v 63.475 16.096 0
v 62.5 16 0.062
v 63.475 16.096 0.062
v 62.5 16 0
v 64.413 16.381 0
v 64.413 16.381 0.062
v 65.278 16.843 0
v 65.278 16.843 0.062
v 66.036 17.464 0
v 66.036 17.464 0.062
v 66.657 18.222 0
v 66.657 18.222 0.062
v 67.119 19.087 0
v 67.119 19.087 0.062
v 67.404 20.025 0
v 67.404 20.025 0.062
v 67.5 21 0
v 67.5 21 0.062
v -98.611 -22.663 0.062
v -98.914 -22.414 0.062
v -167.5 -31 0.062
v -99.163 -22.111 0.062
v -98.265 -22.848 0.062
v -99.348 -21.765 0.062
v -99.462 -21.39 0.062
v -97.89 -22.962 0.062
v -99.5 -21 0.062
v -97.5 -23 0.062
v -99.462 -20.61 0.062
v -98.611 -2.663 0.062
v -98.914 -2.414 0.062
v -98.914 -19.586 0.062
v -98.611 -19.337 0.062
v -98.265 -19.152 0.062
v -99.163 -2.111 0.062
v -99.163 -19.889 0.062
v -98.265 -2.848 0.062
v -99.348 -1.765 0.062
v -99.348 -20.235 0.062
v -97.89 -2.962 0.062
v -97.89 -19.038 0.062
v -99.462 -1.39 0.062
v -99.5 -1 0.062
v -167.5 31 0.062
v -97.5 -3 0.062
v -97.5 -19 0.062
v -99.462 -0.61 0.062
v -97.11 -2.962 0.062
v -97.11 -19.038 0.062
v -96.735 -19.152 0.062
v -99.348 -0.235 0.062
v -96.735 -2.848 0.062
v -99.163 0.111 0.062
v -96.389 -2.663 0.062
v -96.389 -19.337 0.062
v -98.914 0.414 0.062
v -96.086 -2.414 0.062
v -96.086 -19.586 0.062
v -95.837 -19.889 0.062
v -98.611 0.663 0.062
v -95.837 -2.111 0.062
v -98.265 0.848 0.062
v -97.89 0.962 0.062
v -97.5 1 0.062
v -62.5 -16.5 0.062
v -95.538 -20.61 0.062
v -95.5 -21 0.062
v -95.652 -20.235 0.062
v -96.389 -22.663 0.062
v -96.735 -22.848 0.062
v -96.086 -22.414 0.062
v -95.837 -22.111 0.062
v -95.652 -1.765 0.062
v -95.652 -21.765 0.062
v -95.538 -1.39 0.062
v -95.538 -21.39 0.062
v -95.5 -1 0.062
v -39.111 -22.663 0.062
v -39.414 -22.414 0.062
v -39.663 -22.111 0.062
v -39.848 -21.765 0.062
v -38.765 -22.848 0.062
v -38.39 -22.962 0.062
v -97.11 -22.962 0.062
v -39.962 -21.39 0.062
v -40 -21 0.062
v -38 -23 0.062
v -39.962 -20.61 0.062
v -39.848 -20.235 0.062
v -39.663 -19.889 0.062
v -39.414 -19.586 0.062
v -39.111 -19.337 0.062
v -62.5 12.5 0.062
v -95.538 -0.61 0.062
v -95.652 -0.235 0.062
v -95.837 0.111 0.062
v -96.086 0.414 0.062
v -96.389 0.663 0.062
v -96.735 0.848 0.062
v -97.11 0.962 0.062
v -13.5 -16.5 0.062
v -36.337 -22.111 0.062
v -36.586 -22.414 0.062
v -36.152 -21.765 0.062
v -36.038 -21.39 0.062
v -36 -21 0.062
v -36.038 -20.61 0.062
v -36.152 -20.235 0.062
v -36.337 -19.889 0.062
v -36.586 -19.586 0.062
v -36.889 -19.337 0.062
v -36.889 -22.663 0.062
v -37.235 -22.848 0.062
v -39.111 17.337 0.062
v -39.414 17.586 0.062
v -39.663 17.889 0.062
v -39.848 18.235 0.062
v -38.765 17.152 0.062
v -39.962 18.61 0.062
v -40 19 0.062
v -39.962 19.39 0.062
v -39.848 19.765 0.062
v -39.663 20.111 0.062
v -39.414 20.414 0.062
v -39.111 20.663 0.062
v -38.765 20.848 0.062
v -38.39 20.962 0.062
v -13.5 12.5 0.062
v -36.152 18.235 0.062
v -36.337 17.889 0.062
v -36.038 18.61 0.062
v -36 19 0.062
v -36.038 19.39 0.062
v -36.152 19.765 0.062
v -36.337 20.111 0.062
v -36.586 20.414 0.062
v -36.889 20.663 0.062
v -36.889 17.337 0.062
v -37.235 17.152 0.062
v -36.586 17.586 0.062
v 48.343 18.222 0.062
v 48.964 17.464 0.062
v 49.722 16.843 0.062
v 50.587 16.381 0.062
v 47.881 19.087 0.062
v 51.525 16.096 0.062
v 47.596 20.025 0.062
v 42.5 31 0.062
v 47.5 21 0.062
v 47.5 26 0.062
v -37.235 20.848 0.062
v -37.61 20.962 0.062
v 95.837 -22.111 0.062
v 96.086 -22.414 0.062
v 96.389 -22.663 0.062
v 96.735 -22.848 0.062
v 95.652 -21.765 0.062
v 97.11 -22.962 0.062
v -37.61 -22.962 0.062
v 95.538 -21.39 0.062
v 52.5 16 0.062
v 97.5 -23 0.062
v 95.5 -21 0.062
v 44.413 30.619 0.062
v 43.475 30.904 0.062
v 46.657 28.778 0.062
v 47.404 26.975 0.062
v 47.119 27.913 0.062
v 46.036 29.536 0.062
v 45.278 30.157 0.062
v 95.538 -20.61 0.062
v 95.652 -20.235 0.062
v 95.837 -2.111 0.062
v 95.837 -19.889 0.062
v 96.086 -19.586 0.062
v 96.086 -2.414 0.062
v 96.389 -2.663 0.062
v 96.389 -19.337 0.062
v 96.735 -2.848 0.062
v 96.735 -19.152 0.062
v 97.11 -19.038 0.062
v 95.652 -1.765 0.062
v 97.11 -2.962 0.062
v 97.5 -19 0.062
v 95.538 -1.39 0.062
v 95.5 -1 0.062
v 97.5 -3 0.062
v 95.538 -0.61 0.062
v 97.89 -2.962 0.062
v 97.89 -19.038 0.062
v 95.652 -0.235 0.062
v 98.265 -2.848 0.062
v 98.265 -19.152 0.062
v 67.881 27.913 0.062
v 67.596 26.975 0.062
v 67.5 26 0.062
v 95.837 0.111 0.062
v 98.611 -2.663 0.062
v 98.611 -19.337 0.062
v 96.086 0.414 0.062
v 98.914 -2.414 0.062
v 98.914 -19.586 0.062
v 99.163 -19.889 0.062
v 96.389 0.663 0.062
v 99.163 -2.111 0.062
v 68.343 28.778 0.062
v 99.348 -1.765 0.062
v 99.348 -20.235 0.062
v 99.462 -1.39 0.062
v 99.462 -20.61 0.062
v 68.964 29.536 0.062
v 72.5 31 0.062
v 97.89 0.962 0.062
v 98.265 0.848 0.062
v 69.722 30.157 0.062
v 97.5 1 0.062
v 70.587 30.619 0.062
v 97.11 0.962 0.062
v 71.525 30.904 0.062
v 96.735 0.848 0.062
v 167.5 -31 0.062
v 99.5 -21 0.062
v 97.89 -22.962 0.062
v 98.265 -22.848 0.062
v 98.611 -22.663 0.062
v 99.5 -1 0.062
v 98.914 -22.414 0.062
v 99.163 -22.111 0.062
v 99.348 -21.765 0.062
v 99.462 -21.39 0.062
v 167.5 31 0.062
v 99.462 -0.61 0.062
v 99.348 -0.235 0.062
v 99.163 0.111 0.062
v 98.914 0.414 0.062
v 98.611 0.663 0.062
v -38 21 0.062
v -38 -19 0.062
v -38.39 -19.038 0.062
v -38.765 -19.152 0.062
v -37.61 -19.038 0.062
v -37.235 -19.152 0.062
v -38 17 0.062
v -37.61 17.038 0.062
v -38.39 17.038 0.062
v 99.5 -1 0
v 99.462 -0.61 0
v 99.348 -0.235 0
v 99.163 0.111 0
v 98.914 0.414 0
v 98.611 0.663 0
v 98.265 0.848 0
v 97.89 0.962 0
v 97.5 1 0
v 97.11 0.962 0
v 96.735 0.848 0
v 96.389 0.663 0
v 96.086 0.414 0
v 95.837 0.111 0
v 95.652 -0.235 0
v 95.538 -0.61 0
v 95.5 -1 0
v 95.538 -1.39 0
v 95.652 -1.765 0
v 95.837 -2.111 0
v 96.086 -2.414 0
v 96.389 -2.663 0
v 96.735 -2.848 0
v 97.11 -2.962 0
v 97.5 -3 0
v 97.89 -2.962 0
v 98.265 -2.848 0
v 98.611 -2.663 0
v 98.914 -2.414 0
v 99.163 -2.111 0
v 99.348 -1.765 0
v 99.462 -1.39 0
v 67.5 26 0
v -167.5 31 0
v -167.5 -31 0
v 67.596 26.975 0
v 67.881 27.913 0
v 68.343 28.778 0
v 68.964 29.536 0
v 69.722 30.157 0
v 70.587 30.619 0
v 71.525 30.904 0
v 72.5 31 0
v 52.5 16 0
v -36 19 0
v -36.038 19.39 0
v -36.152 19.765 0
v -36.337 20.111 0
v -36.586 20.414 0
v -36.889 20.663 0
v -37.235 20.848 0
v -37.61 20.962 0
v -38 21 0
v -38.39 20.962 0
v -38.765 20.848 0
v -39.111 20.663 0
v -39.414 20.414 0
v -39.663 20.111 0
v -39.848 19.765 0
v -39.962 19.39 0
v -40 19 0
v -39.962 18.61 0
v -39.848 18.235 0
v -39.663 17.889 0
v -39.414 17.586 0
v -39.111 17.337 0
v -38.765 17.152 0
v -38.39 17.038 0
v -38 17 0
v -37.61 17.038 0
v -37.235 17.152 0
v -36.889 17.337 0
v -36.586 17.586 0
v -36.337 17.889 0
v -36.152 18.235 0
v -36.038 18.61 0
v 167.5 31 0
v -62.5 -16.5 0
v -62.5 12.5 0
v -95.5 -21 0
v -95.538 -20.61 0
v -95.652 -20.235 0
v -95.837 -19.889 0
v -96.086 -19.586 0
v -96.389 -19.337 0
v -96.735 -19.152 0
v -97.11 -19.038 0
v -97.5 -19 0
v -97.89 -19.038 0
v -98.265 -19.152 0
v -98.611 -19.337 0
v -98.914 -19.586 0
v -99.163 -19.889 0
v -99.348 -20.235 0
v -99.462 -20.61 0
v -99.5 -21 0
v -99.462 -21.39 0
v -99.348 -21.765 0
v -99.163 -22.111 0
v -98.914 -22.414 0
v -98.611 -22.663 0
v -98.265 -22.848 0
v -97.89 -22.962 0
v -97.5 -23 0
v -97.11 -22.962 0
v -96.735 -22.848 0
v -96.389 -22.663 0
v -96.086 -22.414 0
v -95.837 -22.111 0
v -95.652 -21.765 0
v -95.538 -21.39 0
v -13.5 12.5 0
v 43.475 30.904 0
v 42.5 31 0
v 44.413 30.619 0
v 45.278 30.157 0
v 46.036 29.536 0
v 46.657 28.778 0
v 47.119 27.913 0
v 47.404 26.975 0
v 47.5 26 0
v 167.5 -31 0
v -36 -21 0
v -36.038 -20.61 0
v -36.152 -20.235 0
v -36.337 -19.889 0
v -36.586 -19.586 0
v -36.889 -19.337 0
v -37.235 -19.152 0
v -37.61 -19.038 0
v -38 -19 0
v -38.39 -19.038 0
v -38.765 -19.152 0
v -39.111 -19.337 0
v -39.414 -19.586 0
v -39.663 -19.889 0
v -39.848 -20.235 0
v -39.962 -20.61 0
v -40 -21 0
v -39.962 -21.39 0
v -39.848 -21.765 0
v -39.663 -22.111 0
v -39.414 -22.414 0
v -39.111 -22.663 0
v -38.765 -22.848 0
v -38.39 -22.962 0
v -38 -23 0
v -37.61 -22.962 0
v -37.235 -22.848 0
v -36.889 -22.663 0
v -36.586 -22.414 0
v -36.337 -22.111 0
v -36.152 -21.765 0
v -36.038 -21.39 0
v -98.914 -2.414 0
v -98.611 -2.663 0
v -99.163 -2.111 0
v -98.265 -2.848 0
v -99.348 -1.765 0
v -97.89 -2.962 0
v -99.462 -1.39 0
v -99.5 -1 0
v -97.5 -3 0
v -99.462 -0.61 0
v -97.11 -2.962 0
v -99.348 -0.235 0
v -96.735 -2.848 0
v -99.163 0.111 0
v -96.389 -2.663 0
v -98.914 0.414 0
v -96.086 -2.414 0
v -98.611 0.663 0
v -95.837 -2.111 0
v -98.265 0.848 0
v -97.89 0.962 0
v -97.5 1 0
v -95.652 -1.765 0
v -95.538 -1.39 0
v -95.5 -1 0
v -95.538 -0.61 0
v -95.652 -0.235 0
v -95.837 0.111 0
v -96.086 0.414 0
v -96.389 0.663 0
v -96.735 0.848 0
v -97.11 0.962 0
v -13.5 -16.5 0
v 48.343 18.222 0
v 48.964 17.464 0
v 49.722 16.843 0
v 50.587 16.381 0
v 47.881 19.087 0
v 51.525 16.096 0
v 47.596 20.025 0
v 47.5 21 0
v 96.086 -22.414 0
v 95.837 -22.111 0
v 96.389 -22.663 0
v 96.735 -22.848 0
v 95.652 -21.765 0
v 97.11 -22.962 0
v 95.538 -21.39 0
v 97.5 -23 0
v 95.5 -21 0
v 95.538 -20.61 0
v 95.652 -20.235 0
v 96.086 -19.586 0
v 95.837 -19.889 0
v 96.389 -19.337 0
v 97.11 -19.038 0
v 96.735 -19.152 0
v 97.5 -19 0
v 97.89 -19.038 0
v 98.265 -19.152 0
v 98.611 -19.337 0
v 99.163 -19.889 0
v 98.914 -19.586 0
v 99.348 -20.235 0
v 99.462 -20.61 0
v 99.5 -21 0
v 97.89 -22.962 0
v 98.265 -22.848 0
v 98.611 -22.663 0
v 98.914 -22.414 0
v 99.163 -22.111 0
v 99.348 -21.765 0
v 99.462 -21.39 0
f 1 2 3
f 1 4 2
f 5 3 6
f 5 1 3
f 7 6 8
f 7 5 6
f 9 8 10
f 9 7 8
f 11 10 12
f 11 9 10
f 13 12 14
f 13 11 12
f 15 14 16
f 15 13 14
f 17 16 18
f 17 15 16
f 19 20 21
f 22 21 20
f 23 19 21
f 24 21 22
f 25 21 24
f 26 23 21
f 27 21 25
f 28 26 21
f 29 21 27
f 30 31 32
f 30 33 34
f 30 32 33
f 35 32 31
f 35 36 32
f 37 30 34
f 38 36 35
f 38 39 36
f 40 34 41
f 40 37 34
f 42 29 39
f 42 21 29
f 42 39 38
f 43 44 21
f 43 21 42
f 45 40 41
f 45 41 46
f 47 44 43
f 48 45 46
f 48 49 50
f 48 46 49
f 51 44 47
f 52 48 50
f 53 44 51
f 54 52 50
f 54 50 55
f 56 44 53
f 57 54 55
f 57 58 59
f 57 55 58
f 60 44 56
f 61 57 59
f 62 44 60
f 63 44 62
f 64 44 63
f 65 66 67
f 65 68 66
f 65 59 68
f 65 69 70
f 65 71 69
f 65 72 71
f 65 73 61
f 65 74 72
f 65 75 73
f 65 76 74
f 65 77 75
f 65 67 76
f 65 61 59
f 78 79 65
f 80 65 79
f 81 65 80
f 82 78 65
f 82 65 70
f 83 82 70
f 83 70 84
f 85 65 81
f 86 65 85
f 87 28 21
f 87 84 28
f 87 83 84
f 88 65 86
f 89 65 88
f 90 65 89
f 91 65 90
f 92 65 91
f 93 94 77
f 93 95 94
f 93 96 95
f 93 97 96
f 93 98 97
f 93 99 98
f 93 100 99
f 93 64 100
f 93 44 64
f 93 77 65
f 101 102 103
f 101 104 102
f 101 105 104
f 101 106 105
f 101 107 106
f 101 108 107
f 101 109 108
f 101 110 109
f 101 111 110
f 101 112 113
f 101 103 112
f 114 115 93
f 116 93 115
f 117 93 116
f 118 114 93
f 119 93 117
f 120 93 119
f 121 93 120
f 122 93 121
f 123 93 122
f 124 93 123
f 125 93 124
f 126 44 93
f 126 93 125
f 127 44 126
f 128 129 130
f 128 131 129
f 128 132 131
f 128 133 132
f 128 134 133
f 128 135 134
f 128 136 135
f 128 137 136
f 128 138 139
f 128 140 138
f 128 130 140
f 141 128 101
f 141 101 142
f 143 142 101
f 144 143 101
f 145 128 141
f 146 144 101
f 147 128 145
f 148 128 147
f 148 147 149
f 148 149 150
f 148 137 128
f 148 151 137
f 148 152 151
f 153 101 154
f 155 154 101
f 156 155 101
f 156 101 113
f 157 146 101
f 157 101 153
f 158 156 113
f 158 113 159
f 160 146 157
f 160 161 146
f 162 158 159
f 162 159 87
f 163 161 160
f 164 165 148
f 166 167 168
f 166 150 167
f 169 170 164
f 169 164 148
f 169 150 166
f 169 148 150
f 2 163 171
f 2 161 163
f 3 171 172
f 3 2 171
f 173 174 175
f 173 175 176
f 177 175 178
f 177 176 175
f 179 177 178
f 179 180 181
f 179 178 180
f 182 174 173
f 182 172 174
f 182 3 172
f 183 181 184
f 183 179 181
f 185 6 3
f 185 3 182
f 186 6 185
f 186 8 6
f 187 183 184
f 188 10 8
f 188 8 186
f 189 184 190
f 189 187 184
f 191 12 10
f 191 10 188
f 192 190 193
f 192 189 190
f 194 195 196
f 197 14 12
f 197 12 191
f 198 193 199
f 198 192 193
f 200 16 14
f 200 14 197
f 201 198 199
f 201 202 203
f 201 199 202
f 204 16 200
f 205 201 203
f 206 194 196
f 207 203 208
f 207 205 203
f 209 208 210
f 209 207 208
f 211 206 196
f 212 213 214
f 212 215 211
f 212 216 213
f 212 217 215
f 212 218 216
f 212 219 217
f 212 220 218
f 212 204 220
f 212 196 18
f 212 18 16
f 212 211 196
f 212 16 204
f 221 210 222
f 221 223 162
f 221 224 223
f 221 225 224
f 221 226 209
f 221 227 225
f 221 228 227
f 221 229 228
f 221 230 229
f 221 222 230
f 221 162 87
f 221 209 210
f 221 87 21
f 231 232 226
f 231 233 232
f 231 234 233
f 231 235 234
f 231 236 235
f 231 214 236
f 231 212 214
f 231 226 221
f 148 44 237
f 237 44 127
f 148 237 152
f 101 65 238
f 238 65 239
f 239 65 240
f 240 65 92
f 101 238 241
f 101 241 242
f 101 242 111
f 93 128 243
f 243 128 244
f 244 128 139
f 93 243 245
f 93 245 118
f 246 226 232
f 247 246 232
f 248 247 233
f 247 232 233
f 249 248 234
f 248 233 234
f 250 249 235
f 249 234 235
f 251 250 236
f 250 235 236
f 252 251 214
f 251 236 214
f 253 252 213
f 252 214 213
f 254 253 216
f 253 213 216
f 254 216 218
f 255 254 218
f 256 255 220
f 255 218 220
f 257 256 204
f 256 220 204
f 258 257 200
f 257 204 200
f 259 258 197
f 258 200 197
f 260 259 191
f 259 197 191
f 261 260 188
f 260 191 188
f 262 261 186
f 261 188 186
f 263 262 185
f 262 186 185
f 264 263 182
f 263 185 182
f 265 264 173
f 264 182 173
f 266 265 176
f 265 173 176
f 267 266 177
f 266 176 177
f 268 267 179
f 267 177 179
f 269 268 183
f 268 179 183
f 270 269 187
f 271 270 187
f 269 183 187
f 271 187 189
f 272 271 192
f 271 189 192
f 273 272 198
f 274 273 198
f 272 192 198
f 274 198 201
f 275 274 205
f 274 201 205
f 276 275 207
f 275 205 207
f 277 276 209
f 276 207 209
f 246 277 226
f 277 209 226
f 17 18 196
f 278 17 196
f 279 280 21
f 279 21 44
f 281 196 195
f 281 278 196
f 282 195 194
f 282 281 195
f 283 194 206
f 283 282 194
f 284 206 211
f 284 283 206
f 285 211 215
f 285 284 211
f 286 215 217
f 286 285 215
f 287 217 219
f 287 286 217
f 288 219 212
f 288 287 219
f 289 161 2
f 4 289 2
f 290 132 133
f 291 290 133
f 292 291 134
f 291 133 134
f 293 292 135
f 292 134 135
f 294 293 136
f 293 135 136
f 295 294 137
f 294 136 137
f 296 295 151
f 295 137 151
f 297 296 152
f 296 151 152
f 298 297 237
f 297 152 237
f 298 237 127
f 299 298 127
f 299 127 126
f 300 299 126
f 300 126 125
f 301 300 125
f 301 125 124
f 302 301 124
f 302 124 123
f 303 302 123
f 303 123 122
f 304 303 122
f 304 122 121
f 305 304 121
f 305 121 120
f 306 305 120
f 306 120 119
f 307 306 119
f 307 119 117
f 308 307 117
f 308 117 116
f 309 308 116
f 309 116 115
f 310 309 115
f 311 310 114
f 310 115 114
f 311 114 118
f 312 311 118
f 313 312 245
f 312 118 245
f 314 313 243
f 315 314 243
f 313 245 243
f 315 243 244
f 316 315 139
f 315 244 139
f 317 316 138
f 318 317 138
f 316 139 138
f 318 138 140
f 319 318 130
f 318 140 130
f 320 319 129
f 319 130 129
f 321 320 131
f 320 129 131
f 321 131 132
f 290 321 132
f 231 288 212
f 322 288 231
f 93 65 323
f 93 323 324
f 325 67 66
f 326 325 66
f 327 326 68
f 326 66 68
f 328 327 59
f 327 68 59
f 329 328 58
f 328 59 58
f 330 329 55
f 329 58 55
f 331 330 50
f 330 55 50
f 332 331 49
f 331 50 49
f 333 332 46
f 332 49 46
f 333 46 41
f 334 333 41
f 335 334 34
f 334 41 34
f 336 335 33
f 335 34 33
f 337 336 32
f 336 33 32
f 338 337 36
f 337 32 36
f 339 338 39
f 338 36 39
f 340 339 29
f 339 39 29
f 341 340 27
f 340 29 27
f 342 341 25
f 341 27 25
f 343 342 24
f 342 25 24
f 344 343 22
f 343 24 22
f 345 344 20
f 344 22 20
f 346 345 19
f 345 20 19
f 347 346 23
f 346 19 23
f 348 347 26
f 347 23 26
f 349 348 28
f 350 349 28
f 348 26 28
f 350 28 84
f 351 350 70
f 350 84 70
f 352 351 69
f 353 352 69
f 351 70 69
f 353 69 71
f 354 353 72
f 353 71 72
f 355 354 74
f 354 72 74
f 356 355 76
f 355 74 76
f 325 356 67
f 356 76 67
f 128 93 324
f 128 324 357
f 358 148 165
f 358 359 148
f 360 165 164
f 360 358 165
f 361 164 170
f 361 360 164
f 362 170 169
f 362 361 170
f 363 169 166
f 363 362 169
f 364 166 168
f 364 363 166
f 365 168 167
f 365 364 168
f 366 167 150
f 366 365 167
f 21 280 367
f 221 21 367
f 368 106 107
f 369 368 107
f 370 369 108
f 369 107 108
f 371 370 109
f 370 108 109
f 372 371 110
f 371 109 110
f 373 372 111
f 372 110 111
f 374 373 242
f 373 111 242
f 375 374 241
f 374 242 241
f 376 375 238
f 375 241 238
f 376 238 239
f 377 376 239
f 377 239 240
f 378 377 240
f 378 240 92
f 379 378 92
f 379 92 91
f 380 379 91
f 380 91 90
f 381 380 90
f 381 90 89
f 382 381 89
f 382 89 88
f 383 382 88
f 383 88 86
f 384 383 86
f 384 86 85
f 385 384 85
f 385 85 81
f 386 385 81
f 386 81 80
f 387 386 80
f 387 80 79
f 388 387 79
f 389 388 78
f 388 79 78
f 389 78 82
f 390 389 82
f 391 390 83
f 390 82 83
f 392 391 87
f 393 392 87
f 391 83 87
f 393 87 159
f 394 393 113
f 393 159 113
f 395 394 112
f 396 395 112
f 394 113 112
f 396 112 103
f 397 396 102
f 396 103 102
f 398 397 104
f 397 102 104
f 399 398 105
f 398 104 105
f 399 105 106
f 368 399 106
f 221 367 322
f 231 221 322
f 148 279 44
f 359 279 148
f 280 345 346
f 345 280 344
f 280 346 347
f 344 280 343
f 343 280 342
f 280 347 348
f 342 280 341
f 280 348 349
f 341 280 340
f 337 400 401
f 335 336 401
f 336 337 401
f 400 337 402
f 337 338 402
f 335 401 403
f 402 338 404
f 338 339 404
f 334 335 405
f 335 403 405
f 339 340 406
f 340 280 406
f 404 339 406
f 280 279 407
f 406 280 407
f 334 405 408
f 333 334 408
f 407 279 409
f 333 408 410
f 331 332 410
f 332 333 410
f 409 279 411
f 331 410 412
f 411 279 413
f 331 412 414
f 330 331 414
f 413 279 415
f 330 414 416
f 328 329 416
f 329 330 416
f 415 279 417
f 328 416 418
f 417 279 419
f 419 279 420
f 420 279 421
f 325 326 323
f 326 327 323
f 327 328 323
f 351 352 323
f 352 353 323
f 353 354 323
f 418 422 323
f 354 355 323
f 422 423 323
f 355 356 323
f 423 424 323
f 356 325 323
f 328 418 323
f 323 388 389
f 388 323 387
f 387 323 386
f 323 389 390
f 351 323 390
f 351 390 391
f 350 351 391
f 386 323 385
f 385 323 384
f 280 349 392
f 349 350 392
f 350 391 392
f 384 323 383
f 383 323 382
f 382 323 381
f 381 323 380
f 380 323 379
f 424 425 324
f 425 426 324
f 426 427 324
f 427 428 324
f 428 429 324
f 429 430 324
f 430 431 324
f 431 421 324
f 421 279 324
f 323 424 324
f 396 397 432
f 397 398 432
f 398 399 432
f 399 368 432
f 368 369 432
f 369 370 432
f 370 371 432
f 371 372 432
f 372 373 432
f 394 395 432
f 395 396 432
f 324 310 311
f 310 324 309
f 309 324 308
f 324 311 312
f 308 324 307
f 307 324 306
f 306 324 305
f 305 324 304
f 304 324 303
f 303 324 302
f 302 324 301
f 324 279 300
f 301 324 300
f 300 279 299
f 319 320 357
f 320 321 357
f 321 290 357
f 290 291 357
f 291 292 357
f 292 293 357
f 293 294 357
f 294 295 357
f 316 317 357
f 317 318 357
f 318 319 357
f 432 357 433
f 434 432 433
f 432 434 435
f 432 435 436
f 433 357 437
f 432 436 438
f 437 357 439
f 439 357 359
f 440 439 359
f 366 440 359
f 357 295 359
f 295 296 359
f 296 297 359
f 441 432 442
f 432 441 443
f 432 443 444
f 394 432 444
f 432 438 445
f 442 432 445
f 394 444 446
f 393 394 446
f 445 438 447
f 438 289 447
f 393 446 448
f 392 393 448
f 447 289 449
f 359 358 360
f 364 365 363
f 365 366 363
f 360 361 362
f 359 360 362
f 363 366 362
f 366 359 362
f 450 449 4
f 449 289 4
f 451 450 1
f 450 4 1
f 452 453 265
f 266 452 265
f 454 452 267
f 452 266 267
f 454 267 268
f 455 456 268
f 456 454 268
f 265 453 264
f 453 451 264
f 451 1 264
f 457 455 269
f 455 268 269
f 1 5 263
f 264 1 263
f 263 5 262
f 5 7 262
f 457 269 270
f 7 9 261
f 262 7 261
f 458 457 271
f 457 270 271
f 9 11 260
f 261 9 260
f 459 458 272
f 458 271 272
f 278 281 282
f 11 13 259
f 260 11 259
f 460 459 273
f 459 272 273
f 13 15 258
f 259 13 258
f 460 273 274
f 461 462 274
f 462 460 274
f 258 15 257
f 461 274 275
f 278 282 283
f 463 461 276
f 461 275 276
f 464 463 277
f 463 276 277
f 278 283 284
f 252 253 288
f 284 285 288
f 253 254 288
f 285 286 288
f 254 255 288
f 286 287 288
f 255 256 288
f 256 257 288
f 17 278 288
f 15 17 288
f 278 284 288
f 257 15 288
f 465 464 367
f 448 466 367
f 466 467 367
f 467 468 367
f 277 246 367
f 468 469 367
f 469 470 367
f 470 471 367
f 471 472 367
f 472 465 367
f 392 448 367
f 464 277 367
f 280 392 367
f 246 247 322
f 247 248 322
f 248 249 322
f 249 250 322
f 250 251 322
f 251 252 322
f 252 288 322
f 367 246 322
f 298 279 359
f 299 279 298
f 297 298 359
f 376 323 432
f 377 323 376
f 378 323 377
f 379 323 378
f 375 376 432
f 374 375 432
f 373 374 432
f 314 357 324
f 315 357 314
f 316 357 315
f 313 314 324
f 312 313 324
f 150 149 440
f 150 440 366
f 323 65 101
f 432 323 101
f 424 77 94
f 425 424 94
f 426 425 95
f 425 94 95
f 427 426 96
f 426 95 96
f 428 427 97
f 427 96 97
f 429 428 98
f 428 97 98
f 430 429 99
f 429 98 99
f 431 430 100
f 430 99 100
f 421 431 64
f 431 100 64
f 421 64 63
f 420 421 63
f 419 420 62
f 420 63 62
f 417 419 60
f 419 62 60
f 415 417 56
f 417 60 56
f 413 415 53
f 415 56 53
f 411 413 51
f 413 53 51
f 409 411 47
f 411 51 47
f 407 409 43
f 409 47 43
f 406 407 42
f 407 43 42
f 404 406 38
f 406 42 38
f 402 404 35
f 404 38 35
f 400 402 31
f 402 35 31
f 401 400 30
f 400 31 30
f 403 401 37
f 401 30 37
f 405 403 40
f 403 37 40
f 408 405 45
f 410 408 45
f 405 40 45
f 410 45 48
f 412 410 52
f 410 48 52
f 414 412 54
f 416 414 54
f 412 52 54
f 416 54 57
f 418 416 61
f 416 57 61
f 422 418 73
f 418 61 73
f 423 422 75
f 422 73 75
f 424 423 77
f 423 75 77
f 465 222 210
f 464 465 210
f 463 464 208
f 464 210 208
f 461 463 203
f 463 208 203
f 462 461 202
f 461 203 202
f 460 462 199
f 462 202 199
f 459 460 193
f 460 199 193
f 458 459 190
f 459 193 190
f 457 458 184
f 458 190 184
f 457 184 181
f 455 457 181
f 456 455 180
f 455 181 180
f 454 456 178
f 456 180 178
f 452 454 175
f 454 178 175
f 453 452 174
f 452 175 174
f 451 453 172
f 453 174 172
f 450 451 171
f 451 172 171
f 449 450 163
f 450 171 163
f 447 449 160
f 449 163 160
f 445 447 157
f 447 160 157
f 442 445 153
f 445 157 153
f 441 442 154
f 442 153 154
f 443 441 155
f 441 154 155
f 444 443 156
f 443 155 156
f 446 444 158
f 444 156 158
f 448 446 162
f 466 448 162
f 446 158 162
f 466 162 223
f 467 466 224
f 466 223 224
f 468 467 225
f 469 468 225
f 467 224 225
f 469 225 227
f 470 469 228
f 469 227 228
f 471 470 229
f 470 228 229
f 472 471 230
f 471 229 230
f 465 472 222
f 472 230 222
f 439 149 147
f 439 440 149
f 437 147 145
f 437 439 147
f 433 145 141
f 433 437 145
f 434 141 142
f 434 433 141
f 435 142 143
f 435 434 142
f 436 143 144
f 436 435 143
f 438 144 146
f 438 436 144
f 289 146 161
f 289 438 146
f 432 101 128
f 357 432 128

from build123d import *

# Parameters (mm, degrees)
SKETCH1_W            = 335
SKETCH1_H            = 62
BODY_DEPTH           = 0.0625
SKETCH3_R            = 2
MOUNTING_HOLES_DEPTH = 0.0625
SKETCH4_R            = 2
SKETCH4_W            = 49
SKETCH4_H            = 29
SKETCH4_W_2          = 20
SKETCH4_H_2          = 15
CUT_EXTRUDE1_DEPTH   = 10
FILLET1_R            = 5


with BuildPart() as part:
    # Sketch1 → Body (new body)
    with BuildSketch(Plane.XY):
        Rectangle(SKETCH1_W, SKETCH1_H)
    extrude(amount=BODY_DEPTH)

    # Sketch3 → Mounting Holes (cut)
    with BuildSketch(Plane.XY.offset(0.0625)):
        with Locations((-97.5, -1)):
            Circle(SKETCH3_R)
        with Locations((-97.5, -21)):
            Circle(SKETCH3_R)
        with Locations((97.5, -1)):
            Circle(SKETCH3_R)
        with Locations((97.5, -21)):
            Circle(SKETCH3_R)
    extrude(amount=-MOUNTING_HOLES_DEPTH, mode=Mode.SUBTRACT)

    # Sketch4 → Cut-Extrude1 (cut)
    with BuildSketch(Plane.XY.offset(0.0625)):
        with Locations((-38, 19)):
            Circle(SKETCH4_R)
        with Locations((-38, -21)):
            Circle(SKETCH4_R)
        with Locations((-38, -2)):
            Rectangle(SKETCH4_W, SKETCH4_H)
        with Locations((57.5, 23.5)):
            Rectangle(SKETCH4_W_2, SKETCH4_H_2)
    extrude(amount=-CUT_EXTRUDE1_DEPTH, mode=Mode.SUBTRACT)

    # Fillet1
    fillet1_edges = [part.edges().sort_by_distance(p)[0] for p in [
        (47.5, 16, 0.03125),
        (47.5, 31, 0.03125),
        (67.5, 31, 0.03125),
        (67.5, 16, 0.03125),
    ]]
    fillet(fillet1_edges, radius=FILLET1_R)


solid = part.part
